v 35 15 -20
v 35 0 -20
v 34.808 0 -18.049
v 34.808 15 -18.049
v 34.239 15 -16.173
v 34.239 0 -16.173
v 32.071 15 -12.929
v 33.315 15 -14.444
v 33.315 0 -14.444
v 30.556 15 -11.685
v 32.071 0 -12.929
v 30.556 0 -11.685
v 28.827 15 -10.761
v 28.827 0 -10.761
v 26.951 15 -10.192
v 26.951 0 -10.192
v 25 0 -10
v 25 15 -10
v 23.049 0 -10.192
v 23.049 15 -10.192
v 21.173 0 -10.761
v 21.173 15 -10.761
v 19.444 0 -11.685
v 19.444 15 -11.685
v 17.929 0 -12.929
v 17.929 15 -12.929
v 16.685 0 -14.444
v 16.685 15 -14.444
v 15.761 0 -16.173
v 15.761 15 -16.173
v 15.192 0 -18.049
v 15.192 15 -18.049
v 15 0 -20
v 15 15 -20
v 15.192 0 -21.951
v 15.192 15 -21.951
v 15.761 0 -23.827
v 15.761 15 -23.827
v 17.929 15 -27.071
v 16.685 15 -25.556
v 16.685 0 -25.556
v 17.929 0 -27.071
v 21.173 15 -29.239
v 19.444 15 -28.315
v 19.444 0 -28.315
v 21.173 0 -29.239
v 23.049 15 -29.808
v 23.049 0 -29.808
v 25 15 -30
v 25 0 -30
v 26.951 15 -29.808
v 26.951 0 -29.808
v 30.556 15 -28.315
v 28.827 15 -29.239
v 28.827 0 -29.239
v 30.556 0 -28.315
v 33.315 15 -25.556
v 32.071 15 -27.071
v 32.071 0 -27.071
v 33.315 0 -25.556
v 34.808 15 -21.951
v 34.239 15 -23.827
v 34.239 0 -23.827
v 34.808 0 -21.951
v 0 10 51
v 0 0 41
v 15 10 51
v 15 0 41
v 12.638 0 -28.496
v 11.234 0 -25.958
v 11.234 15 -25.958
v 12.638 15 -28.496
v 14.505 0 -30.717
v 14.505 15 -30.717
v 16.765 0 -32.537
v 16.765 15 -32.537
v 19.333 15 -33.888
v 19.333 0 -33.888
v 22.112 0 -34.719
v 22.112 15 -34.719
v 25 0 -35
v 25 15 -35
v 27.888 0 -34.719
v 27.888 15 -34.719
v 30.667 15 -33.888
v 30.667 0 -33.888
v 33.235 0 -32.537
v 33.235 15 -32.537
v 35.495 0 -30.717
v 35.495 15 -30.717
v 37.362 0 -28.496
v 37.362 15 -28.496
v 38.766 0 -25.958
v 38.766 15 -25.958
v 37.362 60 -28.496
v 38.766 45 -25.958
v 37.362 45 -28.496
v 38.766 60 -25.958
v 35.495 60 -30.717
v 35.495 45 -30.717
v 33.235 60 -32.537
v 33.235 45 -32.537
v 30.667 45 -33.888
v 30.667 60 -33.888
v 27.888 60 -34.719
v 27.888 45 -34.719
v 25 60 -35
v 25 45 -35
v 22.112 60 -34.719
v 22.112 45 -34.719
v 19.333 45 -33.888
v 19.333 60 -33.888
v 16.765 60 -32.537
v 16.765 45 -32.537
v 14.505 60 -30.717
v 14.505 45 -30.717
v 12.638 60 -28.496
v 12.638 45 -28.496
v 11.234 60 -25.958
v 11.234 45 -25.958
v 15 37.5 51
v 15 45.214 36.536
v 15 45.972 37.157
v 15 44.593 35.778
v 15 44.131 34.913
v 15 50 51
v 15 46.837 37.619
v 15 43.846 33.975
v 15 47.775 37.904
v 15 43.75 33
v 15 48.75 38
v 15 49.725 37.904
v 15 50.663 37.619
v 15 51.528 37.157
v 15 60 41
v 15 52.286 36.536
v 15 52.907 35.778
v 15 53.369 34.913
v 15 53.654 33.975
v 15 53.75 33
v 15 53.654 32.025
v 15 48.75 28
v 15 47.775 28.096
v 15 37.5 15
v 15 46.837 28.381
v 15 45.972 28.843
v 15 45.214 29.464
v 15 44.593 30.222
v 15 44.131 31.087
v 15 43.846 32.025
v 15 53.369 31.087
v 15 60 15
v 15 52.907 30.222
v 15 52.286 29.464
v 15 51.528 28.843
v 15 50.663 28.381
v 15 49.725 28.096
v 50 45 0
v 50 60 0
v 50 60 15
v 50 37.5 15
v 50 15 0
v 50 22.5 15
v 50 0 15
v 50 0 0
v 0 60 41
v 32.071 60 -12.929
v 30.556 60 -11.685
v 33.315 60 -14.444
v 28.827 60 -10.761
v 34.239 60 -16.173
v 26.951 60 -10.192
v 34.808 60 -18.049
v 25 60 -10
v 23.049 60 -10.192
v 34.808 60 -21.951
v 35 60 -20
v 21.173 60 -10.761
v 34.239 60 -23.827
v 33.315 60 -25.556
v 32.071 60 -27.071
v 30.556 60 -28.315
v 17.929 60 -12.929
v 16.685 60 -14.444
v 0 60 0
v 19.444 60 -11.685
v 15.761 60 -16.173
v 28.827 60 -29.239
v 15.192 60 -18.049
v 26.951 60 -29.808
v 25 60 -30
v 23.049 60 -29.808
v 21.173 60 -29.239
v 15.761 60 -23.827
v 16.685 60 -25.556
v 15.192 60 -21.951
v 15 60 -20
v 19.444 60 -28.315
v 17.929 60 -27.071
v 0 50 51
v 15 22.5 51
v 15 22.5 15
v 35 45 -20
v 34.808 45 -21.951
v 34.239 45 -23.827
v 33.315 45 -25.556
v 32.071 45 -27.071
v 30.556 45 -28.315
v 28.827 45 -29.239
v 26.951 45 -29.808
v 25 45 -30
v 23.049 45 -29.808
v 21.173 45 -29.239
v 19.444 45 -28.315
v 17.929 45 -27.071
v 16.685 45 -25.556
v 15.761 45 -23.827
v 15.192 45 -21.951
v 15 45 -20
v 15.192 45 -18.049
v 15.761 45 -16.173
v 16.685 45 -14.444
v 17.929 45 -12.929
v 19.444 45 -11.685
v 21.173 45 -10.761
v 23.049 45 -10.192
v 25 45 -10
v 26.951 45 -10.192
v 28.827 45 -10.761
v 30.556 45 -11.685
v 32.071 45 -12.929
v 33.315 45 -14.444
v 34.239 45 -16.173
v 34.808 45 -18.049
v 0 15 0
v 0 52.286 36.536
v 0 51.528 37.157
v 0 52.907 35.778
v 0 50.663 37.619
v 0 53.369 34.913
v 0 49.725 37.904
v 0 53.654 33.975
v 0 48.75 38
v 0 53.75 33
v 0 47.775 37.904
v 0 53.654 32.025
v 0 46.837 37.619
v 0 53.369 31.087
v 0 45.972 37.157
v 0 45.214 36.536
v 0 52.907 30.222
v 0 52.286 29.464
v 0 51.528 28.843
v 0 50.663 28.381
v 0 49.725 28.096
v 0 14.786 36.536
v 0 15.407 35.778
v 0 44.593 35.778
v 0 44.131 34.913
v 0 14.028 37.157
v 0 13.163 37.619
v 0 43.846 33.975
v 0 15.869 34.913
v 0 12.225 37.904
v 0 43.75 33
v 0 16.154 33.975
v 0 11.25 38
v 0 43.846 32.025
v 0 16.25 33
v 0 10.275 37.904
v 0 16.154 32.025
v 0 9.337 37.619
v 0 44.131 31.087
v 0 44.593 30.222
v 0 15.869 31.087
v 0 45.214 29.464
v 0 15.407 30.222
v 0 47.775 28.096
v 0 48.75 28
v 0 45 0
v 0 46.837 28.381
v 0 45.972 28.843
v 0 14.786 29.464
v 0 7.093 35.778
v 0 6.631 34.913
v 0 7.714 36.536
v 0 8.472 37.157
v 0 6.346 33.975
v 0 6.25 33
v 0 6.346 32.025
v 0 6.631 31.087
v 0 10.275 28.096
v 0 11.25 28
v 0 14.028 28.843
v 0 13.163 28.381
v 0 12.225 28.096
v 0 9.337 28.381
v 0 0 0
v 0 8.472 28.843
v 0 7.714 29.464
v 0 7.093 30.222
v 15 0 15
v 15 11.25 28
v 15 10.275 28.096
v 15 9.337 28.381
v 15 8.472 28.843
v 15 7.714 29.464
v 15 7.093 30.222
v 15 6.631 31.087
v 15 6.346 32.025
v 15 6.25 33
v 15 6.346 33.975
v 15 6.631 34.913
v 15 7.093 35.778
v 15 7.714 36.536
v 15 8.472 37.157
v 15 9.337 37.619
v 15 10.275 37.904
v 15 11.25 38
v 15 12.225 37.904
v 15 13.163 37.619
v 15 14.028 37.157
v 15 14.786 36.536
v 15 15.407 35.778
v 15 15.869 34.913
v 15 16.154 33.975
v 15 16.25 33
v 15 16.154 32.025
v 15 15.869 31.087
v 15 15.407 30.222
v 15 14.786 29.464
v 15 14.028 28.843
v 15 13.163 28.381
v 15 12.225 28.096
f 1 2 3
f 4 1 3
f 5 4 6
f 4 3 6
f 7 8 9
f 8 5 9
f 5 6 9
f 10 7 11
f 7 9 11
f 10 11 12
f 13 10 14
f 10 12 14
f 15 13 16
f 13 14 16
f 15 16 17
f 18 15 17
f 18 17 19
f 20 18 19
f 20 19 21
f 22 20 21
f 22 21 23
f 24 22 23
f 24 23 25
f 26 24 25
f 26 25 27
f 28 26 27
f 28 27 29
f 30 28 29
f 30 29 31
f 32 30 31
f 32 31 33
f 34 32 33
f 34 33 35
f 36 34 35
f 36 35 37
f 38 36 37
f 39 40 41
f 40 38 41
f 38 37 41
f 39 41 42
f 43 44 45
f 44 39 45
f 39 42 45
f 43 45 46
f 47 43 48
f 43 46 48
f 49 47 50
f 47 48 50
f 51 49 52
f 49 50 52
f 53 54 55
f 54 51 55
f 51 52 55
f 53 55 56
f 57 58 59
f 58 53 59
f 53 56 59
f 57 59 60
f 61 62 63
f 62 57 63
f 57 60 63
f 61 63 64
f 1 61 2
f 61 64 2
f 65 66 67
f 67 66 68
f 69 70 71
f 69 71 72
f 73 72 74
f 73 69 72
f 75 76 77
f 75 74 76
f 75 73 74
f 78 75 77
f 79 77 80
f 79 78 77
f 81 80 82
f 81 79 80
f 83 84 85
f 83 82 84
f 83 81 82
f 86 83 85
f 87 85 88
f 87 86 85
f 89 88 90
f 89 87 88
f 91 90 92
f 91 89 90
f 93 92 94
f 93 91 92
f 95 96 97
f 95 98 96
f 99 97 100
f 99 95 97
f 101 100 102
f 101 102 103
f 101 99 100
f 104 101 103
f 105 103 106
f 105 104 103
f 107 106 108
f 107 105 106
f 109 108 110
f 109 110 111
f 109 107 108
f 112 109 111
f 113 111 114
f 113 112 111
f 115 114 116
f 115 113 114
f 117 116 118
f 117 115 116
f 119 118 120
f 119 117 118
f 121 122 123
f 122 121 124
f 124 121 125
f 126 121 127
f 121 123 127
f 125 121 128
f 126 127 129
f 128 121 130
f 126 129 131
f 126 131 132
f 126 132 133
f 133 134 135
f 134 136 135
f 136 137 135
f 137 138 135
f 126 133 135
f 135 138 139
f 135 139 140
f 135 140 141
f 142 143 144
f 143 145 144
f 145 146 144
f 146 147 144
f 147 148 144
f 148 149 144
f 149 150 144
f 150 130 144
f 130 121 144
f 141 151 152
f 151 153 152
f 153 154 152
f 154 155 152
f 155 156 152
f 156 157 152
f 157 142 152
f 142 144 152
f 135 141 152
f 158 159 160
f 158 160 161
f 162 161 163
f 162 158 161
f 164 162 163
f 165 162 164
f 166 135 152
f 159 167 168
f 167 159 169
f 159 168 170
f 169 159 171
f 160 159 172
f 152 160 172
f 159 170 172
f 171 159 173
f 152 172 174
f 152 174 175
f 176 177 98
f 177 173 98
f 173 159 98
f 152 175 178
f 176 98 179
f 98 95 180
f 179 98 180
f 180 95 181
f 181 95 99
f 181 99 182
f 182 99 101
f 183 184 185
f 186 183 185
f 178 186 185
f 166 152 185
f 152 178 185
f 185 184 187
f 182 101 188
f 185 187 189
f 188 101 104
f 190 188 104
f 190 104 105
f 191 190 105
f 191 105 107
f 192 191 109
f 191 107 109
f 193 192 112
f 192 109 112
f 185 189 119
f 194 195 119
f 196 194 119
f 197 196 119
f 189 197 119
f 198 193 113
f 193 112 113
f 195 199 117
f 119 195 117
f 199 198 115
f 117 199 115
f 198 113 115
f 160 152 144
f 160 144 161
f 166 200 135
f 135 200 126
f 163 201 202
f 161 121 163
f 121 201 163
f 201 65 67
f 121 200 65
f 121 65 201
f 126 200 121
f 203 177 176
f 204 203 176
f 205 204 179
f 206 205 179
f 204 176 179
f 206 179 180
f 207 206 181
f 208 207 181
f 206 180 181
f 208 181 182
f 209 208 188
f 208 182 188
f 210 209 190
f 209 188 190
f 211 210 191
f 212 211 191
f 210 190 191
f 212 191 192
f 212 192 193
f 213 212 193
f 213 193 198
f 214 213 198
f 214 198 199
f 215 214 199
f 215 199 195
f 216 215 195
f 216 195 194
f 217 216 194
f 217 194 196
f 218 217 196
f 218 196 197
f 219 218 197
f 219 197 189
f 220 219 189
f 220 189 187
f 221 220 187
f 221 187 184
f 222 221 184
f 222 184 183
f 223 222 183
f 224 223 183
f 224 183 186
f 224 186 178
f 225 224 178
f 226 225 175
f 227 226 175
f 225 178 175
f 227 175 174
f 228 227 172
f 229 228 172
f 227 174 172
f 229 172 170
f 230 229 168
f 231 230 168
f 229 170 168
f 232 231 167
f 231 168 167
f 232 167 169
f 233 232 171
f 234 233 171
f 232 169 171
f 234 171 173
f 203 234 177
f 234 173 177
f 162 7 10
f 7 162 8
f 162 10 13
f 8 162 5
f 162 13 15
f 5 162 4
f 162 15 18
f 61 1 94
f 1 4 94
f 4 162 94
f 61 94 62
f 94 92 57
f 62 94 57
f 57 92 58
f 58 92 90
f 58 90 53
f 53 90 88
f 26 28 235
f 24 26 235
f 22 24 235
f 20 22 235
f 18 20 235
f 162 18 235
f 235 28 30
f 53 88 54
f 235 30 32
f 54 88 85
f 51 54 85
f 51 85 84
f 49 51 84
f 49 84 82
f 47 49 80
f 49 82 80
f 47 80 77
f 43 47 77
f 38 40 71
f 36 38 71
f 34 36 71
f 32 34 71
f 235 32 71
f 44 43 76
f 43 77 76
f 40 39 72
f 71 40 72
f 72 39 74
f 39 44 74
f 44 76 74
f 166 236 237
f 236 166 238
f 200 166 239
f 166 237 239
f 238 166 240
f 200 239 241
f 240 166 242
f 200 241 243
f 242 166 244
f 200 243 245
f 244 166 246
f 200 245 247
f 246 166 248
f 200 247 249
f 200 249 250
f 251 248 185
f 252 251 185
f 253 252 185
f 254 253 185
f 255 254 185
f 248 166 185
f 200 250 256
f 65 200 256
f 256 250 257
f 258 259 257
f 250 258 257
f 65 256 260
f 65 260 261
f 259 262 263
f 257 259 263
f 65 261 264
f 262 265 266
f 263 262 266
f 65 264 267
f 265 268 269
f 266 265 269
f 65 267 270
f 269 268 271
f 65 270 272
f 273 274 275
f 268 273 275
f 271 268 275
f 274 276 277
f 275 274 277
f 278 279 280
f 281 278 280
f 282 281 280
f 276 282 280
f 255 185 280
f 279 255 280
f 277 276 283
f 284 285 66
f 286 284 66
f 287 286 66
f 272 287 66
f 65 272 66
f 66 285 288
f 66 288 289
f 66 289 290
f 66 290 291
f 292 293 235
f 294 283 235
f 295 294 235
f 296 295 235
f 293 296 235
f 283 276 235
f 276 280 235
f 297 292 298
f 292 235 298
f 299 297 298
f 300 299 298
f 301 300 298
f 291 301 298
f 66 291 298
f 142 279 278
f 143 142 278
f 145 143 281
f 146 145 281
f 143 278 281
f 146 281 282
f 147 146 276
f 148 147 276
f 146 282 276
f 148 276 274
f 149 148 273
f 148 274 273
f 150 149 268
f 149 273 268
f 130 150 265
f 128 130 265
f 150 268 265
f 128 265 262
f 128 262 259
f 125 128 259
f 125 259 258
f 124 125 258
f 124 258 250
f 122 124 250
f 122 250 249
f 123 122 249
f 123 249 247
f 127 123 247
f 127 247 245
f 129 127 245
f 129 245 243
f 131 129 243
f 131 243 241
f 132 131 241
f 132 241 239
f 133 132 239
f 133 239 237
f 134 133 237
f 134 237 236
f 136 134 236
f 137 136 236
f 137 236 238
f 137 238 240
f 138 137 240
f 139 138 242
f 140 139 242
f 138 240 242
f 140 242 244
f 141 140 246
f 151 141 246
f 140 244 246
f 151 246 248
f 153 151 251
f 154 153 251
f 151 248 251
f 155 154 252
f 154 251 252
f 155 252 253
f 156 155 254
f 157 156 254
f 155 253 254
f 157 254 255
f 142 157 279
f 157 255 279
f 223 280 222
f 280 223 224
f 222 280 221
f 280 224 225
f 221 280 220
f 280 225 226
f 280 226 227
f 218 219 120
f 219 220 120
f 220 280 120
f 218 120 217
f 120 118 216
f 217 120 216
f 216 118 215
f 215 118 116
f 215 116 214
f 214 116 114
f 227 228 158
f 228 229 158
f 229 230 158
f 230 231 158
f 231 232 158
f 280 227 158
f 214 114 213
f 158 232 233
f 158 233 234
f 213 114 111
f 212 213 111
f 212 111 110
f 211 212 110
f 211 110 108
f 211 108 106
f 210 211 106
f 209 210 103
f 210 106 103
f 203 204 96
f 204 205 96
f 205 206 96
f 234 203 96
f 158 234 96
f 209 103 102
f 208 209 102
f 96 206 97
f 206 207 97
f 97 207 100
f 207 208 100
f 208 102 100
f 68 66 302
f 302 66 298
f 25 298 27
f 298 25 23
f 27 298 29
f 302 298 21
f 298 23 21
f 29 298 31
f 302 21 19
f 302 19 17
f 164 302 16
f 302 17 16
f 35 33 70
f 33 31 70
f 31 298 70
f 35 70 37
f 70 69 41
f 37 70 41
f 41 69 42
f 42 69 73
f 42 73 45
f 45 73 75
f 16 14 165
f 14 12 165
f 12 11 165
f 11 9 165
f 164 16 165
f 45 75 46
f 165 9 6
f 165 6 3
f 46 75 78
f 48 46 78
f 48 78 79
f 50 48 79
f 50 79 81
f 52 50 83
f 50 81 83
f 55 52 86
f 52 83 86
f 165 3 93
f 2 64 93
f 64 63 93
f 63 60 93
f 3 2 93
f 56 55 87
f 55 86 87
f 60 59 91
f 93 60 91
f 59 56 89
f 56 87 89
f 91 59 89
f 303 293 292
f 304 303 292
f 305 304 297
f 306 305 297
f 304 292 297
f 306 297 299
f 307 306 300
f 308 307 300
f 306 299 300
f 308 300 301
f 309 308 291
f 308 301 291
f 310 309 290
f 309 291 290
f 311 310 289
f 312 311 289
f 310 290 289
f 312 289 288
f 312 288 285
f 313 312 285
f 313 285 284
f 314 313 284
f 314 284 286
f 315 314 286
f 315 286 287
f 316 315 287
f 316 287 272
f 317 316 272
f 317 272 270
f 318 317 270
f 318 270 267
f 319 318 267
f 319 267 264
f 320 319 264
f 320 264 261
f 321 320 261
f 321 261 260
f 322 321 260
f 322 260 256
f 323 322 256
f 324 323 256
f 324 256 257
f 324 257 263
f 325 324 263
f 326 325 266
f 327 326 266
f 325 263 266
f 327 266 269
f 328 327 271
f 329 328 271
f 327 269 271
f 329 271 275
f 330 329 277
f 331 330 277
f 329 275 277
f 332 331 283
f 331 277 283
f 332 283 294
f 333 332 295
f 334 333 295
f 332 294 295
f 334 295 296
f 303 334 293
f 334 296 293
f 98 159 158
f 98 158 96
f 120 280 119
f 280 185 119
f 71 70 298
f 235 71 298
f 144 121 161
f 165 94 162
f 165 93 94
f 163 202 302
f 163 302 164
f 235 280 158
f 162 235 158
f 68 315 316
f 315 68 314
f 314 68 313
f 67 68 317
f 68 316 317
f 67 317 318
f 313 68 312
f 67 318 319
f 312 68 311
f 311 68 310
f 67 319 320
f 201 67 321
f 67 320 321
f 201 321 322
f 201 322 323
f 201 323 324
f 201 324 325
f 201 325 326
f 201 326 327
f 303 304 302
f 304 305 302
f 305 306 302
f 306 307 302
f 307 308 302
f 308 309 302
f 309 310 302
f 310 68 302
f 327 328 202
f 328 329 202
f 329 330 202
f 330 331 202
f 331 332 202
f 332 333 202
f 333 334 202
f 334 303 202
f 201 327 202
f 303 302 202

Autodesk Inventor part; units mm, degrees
ref_plane "YZ Plane" through (0, 0, 0) normal (1, 0, 0) x (0, 1, 0)
sketch "Sketch1" plane through (0, 0, 0) normal (0, 0, 1) x (1, 0, 0)
  line L0 (0, 60) -> (50, 60)
  line L1 (50, 60) -> (50, 0)
  line L2 (50, 0) -> (0, 0)
  line L3 (0, 0) -> (0, 60)
  dimension "d0" = 50
  dimension "d1" = 60
extrude "Extrusion1" add sketch "Sketch1" along normal blind 15
sketch "Sketch2" plane through (0, 60, 0) normal (0, 1, 0) x (1, 0, 0)
  circle A0 centre (25, 20) radius 10
  circle A1 centre (25, 20) radius 15
  line L0 (50, 0) -> (0, 0) projected
  line L1 (25, 0) -> (25, 35.9147) construction
  line L2 (0, 0) -> (0, -15) construction
  line L3 (0, 0) -> (11.2339, 25.9577)
  line L4 (50, 0) -> (50, -15) projected
  line L5 (50, 0) -> (38.7661, 25.9577)
  dimension "d4" = 20
  dimension "d5" = 30
  dimension "d6" = 20
extrude "Extrusion2" add sketch "Sketch2" against normal blind 15
ref_plane "Work Plane1" through (0, 30, 15) normal (0, 1, 0) x (1, 0, 0)
mirror "Mirror1" about plane through (0, 30, 15) normal (0, 1, 0) of "Extrusion2"
sketch "Sketch3" plane through (0, 0, 15) normal (0, 0, 1) x (1, 0, 0)
  line L0 (50, 0) -> (50, 60) projected
  line L1 (0, 60) -> (0, 0) projected
  line L2 (50, 60) -> (0, 60) projected
  line L3 (0, 0) -> (15, 0)
  line L4 (15, 0) -> (15, 60)
  line L5 (15, 60) -> (0, 60)
  line L6 (0, 60) -> (0, 0)
  dimension "d12" = 15
extrude "Extrusion3" add sketch "Sketch3" along normal blind 36
ref_plane "Work Plane3" through (15, 22.5, 51) normal (0, -1, 0) x (0, 0, -1)
sketch "Sketch5" plane through (15, 22.5, 51) normal (0, -1, 0) x (0, 0, -1)
  line L0 (36, 0) -> (0, 0) projected
  line L1 (0, 0) -> (36, 35)
  line L2 (36, 0) -> (36, 35)
  point P0 (51, -15)
extrude "Extrusion4" add sketch "Sketch5" against normal blind 15
chamfer "Chamfer1" distance 10 angle 45 2 edges at (7.5, 0, 51) (7.5, 60, 51)
sketch "Sketch7" plane through (15, 37.5, 15) normal (1, 0, 0) x (0, 0, -1)
  line L0 (0, 22.5) -> (-26, 22.5) projected
  line L1 (-36, 0) -> (0, 0) projected
  line L2 (0, 0) -> (0, 22.5) projected
  line L3 (-36, 0) -> (-36, 12.5) projected
  line L4 (-5.5947, -7.5) -> (-36, -7.5) construction
  line L5 (-36, 12.5) -> (-36, -27.5) construction
  point P0 (15, -37.5)
  point P1 (-18, 11.25)
  point P2 (-18, -26.25)
  dimension "d28" = 11.25
  dimension "d29" = 22.5
  dimension "d30" = 36
  dimension "d31" = 18
hole "Hole2" at (15, 48.75, 33) at (15, 11.25, 33) direction (-1, 0, 0) diameter 10 end through all
equation "\"d28\" = 0.5 * d29"
equation "\"d31\" = 0.5 * d30"
properties part number "01"
